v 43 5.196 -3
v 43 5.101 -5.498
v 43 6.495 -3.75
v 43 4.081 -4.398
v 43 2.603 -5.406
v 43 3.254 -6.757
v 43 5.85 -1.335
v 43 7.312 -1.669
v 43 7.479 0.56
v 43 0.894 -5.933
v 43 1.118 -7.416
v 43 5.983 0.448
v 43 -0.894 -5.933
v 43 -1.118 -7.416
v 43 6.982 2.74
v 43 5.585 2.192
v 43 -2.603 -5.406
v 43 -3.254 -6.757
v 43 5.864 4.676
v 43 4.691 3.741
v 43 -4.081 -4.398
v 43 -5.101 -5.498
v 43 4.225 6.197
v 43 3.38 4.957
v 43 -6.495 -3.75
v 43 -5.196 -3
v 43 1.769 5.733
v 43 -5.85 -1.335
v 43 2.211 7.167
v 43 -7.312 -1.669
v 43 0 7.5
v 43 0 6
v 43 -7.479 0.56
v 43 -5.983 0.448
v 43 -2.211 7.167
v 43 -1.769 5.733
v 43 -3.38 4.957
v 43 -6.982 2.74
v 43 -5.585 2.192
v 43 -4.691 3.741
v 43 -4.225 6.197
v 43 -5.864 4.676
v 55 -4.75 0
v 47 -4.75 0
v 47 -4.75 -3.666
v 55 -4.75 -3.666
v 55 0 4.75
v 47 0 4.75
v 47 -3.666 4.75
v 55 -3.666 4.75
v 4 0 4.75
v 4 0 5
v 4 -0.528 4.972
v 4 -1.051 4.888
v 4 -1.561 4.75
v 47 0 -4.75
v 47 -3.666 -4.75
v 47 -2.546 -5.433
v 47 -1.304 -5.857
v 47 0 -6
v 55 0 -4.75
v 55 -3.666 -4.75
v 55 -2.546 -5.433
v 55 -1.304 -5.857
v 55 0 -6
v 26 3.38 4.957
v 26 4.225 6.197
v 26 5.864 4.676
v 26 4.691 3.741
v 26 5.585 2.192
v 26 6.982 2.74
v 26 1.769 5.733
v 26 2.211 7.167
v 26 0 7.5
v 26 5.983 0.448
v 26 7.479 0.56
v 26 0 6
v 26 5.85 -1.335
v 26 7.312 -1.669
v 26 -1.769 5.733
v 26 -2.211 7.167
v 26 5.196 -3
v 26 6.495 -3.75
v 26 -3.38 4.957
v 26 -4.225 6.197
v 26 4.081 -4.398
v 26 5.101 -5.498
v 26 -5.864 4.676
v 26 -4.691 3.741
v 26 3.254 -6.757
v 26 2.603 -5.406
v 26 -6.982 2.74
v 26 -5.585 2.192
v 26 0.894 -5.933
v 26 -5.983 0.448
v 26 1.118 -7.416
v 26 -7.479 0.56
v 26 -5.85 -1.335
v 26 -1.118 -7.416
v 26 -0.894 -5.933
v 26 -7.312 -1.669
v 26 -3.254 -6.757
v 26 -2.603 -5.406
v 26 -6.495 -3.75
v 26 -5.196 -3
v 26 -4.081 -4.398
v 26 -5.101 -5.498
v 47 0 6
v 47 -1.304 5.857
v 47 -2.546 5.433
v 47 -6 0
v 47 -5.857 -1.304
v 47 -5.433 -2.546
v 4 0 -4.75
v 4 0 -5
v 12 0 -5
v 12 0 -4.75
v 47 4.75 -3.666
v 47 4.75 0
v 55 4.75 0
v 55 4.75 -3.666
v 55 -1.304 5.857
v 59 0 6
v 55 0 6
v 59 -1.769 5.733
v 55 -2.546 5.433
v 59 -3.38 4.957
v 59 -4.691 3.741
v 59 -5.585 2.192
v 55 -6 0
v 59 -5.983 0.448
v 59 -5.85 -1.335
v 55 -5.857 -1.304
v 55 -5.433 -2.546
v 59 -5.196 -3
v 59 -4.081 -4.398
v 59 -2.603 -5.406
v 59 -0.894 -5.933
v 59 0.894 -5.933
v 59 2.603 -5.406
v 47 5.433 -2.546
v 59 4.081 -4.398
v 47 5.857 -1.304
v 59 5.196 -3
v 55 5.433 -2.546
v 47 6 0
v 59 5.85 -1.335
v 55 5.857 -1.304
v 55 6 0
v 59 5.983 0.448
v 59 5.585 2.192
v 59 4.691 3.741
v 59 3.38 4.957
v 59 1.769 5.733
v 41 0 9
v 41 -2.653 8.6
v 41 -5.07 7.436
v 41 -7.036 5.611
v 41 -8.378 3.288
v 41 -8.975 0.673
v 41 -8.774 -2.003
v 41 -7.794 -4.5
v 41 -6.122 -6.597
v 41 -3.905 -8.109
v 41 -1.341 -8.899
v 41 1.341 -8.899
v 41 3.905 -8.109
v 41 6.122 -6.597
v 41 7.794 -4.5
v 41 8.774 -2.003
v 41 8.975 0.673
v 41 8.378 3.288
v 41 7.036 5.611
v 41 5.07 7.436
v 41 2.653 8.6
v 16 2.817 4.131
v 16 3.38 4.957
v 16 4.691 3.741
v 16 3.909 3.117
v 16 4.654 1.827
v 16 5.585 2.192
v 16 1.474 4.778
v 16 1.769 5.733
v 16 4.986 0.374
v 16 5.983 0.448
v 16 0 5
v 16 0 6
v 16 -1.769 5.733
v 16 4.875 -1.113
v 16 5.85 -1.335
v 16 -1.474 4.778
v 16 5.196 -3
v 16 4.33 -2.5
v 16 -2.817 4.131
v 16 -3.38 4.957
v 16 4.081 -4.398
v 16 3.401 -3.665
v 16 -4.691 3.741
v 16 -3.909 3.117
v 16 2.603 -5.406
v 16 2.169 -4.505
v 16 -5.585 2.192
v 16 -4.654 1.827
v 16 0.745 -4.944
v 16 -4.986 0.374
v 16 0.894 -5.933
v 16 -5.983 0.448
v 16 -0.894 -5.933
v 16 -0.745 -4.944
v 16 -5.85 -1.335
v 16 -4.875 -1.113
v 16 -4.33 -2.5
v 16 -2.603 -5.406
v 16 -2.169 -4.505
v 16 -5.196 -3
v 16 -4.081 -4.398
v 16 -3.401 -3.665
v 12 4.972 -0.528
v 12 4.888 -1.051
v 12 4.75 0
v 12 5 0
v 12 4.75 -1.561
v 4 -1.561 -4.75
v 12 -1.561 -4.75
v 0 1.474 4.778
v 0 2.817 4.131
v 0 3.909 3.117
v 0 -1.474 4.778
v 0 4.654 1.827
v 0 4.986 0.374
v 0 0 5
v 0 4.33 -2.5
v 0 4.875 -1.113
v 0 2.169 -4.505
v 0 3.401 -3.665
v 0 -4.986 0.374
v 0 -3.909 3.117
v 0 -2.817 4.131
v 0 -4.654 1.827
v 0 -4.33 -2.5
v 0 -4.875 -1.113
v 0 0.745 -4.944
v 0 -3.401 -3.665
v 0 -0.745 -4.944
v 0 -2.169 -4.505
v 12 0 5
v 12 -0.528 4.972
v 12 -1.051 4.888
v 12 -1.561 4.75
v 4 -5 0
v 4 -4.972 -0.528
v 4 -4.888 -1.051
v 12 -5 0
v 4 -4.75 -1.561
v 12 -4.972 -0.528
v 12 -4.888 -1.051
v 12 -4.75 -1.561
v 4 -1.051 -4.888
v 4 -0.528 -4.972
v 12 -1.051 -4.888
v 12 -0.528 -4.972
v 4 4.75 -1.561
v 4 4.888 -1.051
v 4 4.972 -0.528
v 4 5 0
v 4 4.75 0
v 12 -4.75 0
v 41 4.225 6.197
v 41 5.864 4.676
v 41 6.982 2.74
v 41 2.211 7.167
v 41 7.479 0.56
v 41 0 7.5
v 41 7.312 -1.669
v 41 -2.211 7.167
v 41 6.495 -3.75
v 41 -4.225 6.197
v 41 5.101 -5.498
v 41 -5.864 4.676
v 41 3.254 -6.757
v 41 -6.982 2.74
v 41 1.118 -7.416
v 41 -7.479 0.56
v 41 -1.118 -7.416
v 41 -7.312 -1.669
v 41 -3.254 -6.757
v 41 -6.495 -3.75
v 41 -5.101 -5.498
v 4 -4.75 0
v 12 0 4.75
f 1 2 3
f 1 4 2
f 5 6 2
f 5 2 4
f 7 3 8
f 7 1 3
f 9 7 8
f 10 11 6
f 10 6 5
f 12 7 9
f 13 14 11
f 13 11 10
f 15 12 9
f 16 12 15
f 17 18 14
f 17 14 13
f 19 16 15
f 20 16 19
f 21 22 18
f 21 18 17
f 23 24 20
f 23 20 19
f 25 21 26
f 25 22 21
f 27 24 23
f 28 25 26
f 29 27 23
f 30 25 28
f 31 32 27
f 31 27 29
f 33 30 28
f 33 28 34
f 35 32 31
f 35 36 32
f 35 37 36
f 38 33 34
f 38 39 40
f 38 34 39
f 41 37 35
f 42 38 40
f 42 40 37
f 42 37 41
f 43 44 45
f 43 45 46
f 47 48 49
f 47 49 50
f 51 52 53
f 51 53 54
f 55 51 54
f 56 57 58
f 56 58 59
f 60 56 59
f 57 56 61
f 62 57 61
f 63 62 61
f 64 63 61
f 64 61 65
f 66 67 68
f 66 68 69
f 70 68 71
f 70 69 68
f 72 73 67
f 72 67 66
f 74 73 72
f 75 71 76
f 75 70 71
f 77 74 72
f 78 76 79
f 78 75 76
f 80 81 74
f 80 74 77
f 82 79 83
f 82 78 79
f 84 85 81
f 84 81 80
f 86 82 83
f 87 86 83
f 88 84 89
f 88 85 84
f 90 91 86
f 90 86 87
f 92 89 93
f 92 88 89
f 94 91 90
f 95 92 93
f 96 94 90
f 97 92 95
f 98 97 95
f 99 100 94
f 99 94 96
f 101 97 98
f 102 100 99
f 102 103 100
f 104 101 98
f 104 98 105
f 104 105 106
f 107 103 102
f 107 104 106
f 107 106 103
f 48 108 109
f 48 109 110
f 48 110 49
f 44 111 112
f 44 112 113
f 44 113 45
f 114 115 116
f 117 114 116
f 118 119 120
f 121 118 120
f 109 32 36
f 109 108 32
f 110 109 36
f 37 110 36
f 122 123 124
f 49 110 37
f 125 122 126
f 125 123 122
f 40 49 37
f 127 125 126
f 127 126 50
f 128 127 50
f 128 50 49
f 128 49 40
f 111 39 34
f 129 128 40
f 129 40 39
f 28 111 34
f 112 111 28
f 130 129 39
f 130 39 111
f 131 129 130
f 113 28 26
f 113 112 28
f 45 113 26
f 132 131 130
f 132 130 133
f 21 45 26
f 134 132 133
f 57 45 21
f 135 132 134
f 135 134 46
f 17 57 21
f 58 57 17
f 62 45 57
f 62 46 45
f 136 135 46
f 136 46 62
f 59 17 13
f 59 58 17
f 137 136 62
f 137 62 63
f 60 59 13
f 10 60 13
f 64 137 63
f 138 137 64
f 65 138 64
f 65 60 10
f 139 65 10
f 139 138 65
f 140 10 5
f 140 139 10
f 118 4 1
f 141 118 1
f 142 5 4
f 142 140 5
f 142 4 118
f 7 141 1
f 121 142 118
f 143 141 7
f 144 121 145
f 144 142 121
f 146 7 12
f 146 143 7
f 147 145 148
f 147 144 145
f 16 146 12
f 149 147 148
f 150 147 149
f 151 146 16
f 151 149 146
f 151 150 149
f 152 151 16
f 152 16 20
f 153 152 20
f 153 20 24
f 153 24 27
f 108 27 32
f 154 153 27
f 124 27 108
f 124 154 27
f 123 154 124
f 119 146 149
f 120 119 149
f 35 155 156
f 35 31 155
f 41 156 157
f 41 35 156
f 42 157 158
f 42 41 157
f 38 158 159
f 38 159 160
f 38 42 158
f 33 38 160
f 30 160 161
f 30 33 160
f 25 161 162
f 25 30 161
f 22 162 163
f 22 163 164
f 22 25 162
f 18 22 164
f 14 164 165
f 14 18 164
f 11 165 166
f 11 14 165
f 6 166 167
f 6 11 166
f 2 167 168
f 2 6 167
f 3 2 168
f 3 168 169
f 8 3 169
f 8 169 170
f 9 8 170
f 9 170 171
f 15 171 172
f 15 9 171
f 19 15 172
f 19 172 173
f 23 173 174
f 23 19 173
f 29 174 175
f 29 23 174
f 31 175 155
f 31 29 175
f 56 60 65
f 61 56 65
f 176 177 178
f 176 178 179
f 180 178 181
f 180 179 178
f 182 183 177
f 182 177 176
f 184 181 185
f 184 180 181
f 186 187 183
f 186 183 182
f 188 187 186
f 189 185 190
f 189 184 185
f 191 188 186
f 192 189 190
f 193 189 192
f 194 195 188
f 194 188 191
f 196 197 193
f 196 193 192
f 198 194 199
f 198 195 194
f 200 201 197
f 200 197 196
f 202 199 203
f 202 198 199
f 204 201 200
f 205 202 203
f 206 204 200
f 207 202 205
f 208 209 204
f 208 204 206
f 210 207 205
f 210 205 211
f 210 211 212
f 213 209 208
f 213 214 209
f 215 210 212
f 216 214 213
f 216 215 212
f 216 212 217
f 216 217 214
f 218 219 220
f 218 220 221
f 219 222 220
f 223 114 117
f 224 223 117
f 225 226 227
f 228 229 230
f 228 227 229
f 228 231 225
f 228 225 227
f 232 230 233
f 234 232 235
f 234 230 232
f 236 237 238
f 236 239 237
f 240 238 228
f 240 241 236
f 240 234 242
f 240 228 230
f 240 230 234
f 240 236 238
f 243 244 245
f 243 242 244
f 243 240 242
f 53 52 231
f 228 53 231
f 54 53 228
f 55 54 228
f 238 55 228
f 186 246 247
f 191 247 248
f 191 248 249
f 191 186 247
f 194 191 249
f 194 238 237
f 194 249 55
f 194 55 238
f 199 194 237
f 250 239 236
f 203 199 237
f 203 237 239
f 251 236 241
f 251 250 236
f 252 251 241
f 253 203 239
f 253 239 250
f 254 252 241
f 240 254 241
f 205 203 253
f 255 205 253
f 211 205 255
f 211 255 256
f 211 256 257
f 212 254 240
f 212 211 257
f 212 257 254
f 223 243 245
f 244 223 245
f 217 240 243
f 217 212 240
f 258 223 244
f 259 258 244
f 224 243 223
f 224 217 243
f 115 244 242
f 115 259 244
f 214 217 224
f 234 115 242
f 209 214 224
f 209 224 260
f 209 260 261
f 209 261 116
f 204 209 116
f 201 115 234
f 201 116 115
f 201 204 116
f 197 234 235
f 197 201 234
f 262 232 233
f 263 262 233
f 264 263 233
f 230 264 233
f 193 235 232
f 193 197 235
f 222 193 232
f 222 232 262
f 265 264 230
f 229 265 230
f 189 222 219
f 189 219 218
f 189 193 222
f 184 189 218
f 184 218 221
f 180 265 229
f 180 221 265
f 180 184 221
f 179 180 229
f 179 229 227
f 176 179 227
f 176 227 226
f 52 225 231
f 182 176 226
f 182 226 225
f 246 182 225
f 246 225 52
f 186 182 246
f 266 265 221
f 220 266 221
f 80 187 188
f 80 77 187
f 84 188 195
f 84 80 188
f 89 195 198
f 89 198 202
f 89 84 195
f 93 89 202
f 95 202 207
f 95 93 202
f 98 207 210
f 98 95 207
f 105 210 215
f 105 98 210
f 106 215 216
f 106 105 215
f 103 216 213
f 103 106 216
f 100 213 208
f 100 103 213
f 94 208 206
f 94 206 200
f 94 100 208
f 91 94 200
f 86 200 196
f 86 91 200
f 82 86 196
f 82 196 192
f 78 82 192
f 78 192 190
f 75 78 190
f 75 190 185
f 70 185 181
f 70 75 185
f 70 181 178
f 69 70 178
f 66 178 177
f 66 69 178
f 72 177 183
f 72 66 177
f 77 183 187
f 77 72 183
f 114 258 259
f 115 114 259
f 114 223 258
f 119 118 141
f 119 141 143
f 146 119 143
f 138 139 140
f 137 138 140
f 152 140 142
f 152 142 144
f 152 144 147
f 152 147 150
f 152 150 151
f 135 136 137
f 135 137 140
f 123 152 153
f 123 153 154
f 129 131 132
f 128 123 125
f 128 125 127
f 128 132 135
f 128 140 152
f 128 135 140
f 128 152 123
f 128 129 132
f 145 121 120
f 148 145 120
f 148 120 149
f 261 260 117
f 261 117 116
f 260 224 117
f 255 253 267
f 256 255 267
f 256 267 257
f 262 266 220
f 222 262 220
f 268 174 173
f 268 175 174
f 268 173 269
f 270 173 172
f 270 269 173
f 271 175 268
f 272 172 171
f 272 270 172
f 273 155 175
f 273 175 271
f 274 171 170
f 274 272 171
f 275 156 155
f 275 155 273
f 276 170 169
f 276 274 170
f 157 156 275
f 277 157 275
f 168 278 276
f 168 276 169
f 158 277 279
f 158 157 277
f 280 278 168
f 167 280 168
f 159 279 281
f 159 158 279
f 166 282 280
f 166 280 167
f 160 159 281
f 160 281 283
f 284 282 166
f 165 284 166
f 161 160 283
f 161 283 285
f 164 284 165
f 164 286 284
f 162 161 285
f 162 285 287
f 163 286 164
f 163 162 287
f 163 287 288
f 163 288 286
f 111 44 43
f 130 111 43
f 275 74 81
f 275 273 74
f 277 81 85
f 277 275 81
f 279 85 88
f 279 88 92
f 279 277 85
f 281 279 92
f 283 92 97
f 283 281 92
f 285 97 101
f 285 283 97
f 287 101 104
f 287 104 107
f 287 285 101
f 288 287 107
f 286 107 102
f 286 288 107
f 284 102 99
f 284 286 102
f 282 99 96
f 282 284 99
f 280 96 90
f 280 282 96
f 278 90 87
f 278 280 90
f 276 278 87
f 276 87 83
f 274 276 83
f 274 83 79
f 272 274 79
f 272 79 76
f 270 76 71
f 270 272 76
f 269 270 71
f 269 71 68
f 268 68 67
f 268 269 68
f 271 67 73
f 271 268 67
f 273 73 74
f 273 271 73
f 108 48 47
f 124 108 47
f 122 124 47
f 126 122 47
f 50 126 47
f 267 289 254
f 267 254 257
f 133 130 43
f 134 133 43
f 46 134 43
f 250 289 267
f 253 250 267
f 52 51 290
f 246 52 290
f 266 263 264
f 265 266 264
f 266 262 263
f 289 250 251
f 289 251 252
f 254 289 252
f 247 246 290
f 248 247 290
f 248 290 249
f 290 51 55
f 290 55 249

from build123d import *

# Parameters (mm, degrees)
SKETCH2_W                     = 8
SKETCH2_H                     = 10.25
CUT_FLATS_TOP_BOT_LEFT_DEPTH  = 30
SKETCH3_W                     = 8
SKETCH3_H                     = 10.25
CUT_FLATS_SIDES_LEFT_DEPTH    = 30
SKETCH4_W                     = 8
SKETCH4_H                     = 10.25
CUT_FLATS_TOP_BOT_RIGHT_DEPTH = 30
SKETCH5_W                     = 8
SKETCH5_H                     = 10.25
CUT_FLATS_SIDES_RIGHT_DEPTH   = 30


with BuildPart() as part:
    # Sketch1 → Revolve-Shaft (revolve)
    with BuildSketch(Plane.XY, mode=Mode.PRIVATE) as revolve_shaft_sk:
        Polygon((0, 0), (0, 5), (16, 5), (16, 6), (26, 6), (26, 7.5), (41, 7.5), (41, 9), (43, 7.5), (43, 6), (59, 6), (59, 0), align=None)
    revolve(revolve_shaft_sk.sketch.rotate(Axis((0, 0, 0), (1, 0, 0)), 90), axis=Axis((0, 0, 0), (1, 0, 0)))

    # Sketch2 → Cut-Flats Top-Bot Left (cut)
    with BuildSketch(Plane(origin=(0, 0, 0), x_dir=(1, 0, 0), z_dir=(0, 1, 0))):
        with Locations((8, 9.875)):
            Rectangle(SKETCH2_W, SKETCH2_H)
        with Locations((8, -9.875)):
            Rectangle(SKETCH2_W, SKETCH2_H)
    extrude(amount=-CUT_FLATS_TOP_BOT_LEFT_DEPTH, mode=Mode.SUBTRACT)

    # Sketch3 → Cut-Flats Sides Left (cut)
    with BuildSketch(Plane.XY):
        with Locations((8, 9.875)):
            Rectangle(SKETCH3_W, SKETCH3_H)
        with Locations((8, -9.875)):
            Rectangle(SKETCH3_W, SKETCH3_H)
    extrude(amount=-CUT_FLATS_SIDES_LEFT_DEPTH, mode=Mode.SUBTRACT)

    # Sketch4 → Cut-Flats Top-Bot Right (cut)
    with BuildSketch(Plane(origin=(0, 0, 0), x_dir=(1, 0, 0), z_dir=(0, 1, 0))):
        with Locations((51, 9.875)):
            Rectangle(SKETCH4_W, SKETCH4_H)
        with Locations((51, -9.875)):
            Rectangle(SKETCH4_W, SKETCH4_H)
    extrude(amount=-CUT_FLATS_TOP_BOT_RIGHT_DEPTH, mode=Mode.SUBTRACT)

    # Sketch5 → Cut-Flats Sides Right (cut)
    with BuildSketch(Plane.XY):
        with Locations((51, 9.875)):
            Rectangle(SKETCH5_W, SKETCH5_H)
        with Locations((51, -9.875)):
            Rectangle(SKETCH5_W, SKETCH5_H)
    extrude(amount=-CUT_FLATS_SIDES_RIGHT_DEPTH, mode=Mode.SUBTRACT)


solid = part.part
